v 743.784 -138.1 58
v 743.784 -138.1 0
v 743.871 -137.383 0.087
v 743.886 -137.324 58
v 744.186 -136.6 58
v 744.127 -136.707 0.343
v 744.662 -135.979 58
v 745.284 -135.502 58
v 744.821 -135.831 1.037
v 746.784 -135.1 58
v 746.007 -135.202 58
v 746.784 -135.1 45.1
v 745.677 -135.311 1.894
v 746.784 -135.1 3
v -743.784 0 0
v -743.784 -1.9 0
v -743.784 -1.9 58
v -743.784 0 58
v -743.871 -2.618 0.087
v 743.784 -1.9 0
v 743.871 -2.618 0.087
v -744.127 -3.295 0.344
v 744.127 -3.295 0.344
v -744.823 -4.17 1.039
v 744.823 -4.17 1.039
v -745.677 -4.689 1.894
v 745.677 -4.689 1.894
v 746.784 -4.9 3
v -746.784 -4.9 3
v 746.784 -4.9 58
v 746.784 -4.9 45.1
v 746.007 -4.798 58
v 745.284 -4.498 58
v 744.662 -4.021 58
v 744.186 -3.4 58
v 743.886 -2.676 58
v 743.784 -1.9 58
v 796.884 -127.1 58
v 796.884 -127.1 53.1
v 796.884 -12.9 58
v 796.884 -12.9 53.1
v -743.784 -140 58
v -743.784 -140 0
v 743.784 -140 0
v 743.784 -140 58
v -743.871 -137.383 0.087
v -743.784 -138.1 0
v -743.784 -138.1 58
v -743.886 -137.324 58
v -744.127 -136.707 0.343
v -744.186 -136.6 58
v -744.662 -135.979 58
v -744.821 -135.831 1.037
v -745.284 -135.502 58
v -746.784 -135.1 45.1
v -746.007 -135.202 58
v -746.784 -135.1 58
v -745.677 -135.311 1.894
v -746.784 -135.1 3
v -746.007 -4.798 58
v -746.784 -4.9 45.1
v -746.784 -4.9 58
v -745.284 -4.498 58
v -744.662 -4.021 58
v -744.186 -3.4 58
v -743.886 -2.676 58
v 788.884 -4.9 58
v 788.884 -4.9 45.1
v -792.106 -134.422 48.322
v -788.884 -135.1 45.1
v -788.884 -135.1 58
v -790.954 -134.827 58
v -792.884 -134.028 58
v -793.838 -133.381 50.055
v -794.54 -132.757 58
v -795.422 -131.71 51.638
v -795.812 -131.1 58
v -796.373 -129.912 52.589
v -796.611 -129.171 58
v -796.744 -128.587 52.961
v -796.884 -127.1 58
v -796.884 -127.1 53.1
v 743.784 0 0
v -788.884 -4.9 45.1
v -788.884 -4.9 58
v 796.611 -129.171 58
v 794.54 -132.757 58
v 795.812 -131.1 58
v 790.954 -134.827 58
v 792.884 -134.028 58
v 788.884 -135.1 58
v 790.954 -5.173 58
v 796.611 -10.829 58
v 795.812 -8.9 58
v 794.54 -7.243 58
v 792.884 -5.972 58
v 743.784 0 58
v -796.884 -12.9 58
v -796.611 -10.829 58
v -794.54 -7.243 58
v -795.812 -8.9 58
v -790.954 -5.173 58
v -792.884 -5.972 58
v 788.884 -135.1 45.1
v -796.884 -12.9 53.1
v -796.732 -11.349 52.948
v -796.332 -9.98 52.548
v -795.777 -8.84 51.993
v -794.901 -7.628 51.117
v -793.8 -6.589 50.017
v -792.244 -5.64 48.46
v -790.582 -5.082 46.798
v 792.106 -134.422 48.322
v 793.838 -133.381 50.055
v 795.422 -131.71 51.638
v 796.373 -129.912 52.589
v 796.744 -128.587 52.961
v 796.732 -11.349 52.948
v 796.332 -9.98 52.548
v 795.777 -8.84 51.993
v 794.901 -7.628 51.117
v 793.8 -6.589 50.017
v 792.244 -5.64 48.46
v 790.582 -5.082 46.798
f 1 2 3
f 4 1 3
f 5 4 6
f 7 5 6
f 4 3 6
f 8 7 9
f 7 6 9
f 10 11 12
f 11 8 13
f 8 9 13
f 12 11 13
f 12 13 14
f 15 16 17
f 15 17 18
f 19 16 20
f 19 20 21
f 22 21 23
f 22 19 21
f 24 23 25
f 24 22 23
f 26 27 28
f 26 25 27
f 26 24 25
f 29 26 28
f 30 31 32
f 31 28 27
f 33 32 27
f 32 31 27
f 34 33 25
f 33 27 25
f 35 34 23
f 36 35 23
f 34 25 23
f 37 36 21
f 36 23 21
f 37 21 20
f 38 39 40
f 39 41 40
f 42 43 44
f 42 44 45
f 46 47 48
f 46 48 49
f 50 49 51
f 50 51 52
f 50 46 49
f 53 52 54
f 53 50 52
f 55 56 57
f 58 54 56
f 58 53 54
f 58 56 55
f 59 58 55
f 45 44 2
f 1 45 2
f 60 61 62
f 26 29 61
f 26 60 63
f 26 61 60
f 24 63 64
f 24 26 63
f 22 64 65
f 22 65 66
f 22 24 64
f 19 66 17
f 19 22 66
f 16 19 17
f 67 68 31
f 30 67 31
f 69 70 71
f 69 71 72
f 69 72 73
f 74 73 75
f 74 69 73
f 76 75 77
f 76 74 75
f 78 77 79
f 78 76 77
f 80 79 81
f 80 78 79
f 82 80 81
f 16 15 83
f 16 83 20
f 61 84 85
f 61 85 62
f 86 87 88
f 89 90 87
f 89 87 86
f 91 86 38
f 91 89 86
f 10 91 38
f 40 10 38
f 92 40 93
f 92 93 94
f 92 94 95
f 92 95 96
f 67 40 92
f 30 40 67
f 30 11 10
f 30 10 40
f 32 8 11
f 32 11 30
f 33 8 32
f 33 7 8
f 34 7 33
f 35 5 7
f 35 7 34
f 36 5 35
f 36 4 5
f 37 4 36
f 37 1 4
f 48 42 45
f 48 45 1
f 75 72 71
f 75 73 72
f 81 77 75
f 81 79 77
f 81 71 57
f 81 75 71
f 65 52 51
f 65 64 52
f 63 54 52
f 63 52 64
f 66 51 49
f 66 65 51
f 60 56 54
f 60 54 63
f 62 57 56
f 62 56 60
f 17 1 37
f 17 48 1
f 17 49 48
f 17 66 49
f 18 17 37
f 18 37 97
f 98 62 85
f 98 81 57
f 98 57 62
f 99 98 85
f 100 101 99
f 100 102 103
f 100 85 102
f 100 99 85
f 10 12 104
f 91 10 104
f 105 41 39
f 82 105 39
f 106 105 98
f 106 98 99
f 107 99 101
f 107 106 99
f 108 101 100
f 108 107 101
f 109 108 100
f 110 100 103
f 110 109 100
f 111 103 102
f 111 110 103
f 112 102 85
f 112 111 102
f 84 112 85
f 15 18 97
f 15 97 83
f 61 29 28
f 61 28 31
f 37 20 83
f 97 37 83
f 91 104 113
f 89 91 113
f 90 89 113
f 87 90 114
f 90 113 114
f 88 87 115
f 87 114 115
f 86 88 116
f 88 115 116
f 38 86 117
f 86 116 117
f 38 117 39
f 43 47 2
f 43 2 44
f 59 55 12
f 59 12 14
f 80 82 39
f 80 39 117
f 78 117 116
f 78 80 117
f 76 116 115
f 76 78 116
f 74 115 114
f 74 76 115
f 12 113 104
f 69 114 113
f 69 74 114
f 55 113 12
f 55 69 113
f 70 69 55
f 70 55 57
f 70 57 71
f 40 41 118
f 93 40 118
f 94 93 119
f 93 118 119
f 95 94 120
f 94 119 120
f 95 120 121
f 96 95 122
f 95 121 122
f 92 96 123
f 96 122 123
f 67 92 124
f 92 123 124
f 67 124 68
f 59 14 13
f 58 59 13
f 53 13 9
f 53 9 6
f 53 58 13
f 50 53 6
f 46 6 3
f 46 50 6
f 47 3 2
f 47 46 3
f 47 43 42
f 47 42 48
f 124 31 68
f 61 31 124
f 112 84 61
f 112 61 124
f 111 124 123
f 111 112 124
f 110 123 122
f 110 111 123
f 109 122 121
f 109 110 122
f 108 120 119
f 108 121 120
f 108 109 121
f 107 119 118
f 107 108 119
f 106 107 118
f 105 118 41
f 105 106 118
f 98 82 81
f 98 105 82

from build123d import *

# Parameters (mm, degrees)
EXTRUDE_1_DEPTH = 796.883643365
OTHER_1_DEPTH   = 58


# Read off the part's stored shape, not the designer's step: Полость1
with BuildPart() as part:
    # Эскиз2 → Бобышка-Вытянуть1 (new body)
    with BuildSketch(Plane(origin=(0, 0, 0), x_dir=(0, 0, -1), z_dir=(1, 0, 0))):
        with BuildLine():
            Line((-58, -140), (-58, 0))
            Line((-58, 0), (0, 0))
            Line((0, 0), (0, -1.9))
            ThreePointArc((0, -1.9), (-0.878679656, -4.021320344), (-3, -4.9))
            Line((-3, -4.9), (-45.1, -4.9))
            ThreePointArc((-45.1, -4.9), (-50.756854249, -7.243145751), (-53.1, -12.9))
            Line((-53.1, -12.9), (-53.1, -127.1))
            ThreePointArc((-53.1, -127.1), (-50.756854249, -132.756854249), (-45.1, -135.1))
            Line((-45.1, -135.1), (-3, -135.1))
            ThreePointArc((-3, -135.1), (-0.878679656, -135.978679656), (0, -138.1))
            Line((0, -138.1), (0, -140))
            Line((0, -140), (-58, -140))
        make_face()
    extrude(amount=-EXTRUDE_1_DEPTH)

    # Полость1 outline → Полость1 (cut)
    with BuildSketch(Plane.XY):
        with BuildLine():
            Line((-796.883643365, -140), (-743.783643365, -140))
            Line((-743.783643365, -140), (-743.783643365, -138.1))
            ThreePointArc((-743.783643365, -138.1), (-744.662323022, -135.978679656), (-746.783643365, -135.1))
            Line((-746.783643365, -135.1), (-788.883643365, -135.1))
            ThreePointArc((-788.883643365, -135.1), (-794.540497615, -132.75685425), (-796.883643365, -127.1))
            Line((-796.883643365, -127.1), (-796.883643365, -140))
        make_face()
        with BuildLine():
            ThreePointArc((-796.883643365, -12.9), (-794.540497615, -7.24314575), (-788.883643365, -4.9))
            Line((-788.883643365, -4.9), (-746.783643365, -4.9))
            ThreePointArc((-746.783643365, -4.9), (-744.662323022, -4.021320343), (-743.783643365, -1.9))
            Line((-743.783643365, -1.9), (-743.783643365, 0))
            Line((-743.783643365, 0), (-796.883643365, 0))
            Line((-796.883643365, 0), (-796.883643365, -12.9))
        make_face()
    extrude(amount=OTHER_1_DEPTH, mode=Mode.SUBTRACT)

    # Зеркальное отражение1: part across plane


with BuildPart() as part_1:
    add(part.part)
    add(part.part.mirror(Plane(origin=(0, -1.9, 3), x_dir=(0, 0, 1), z_dir=(-1, 0, 0))))


solid = part_1.part
